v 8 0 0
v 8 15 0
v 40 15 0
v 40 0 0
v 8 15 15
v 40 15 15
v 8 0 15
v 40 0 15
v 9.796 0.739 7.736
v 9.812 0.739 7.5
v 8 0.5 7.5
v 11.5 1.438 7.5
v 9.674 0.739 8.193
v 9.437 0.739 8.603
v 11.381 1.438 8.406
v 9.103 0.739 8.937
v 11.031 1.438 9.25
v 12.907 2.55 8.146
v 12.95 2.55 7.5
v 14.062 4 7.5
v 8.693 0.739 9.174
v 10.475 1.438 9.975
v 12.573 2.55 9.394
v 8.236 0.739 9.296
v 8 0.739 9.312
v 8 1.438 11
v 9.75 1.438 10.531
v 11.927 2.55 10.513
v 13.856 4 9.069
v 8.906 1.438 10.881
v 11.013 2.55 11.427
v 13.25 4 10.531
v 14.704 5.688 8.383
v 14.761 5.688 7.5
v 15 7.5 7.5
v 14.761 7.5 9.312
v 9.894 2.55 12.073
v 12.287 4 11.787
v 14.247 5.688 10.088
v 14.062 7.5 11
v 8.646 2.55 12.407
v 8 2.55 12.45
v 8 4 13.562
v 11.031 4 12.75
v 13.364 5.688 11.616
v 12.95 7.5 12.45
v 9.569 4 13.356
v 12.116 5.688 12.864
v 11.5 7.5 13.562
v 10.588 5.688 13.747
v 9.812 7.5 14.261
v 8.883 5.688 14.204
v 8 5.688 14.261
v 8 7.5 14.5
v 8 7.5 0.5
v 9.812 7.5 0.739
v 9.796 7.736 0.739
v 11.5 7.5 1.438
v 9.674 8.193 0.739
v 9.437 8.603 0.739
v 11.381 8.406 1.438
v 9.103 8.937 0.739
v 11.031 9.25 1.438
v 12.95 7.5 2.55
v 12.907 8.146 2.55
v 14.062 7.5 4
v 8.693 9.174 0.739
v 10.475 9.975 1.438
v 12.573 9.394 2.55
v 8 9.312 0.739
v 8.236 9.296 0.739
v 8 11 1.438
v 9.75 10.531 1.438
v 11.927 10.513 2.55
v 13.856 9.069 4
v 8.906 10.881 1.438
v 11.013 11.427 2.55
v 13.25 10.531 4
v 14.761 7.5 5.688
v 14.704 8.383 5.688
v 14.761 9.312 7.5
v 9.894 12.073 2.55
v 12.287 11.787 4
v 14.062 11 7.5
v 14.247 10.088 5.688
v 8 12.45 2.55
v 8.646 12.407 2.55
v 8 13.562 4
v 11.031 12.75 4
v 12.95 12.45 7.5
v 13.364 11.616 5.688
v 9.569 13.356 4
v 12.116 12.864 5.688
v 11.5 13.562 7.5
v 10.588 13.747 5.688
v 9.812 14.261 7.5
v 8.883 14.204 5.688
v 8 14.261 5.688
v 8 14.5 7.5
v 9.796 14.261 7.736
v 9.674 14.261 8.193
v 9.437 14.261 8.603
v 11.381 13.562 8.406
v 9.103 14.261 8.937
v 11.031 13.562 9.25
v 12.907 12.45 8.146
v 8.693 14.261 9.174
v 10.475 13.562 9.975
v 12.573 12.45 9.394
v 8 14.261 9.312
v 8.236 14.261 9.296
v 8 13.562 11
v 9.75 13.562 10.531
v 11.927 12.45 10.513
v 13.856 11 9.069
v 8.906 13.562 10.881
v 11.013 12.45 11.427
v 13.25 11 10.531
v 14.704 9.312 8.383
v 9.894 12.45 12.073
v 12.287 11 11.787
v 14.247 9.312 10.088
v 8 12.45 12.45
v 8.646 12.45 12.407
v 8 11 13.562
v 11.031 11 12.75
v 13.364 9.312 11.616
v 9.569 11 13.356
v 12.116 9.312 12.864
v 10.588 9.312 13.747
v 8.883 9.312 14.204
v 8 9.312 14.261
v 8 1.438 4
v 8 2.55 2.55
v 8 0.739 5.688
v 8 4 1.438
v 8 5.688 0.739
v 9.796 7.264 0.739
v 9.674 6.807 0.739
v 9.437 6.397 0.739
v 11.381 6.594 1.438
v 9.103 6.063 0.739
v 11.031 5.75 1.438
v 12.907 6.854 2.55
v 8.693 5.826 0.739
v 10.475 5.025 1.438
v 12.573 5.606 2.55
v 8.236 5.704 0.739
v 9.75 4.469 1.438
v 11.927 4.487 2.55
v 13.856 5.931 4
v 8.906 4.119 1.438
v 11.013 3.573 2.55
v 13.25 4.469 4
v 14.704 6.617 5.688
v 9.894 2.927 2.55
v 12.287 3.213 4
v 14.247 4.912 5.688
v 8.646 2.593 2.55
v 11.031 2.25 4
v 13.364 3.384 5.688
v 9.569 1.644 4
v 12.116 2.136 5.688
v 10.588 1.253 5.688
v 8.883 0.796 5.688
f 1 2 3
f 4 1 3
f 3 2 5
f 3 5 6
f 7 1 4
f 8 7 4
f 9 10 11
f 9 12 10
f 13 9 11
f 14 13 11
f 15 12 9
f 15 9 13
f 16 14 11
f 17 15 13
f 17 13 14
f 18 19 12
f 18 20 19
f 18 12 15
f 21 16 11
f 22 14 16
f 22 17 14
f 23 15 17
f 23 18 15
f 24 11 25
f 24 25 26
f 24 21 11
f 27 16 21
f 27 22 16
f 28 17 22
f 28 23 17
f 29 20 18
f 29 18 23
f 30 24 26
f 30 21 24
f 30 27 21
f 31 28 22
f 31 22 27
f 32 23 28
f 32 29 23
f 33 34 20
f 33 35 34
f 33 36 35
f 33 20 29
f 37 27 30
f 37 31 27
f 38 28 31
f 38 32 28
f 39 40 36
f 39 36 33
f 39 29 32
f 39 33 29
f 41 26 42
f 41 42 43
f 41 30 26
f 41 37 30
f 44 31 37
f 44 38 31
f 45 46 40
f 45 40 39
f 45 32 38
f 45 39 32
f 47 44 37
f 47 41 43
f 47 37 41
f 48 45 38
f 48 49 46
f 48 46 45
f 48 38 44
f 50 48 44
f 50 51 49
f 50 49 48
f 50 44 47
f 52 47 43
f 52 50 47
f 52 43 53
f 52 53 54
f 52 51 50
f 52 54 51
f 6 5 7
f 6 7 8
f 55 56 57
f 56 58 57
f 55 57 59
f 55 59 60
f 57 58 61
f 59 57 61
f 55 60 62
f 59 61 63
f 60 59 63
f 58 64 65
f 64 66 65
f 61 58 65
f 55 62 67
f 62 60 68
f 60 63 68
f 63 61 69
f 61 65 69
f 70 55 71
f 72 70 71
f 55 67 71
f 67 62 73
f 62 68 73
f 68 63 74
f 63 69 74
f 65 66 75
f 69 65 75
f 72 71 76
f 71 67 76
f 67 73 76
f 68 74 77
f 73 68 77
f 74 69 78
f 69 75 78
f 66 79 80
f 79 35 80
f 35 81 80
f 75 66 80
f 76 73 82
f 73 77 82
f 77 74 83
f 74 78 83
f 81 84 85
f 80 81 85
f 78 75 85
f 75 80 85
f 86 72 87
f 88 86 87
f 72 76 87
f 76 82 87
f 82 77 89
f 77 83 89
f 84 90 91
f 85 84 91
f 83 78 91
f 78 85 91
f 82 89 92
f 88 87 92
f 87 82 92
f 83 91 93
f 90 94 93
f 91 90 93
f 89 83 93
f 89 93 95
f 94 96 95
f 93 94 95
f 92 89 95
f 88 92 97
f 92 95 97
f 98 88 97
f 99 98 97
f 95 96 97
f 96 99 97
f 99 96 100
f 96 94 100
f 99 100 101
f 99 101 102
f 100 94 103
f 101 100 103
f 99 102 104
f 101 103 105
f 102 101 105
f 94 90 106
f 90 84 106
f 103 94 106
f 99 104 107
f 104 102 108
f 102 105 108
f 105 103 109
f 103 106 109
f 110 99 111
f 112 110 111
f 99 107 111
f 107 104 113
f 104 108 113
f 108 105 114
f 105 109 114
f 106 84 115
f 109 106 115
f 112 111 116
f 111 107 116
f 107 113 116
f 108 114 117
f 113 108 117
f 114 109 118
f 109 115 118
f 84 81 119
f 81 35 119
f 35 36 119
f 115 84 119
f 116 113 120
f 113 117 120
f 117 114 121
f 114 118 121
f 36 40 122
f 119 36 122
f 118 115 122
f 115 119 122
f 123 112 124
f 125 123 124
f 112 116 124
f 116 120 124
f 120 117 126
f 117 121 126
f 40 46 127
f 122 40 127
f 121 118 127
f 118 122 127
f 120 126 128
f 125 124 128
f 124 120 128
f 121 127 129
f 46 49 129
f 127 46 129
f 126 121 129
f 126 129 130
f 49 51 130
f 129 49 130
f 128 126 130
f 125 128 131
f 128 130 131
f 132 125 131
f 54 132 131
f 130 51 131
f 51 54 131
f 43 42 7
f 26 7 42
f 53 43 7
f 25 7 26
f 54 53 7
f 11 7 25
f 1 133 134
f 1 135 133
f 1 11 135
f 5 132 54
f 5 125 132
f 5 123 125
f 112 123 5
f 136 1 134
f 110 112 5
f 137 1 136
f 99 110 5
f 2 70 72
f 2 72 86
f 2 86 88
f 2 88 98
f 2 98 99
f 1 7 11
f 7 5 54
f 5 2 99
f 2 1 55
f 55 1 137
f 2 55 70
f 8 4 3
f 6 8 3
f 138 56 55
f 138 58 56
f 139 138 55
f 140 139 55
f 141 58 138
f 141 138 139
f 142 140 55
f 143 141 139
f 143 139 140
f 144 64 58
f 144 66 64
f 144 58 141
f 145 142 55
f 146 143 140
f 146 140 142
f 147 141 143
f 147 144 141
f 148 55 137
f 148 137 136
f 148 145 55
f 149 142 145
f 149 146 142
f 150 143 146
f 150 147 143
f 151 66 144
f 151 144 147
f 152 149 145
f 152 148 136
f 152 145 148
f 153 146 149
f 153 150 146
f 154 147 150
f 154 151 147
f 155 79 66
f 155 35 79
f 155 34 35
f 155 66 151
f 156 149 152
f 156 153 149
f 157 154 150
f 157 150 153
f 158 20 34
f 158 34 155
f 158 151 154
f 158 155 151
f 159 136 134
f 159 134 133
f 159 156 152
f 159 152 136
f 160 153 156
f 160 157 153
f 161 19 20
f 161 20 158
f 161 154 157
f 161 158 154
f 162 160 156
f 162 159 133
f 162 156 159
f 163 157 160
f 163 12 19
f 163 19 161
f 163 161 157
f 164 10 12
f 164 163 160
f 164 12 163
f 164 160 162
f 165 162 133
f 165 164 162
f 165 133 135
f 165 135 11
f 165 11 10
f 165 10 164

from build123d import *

# Parameters (mm, degrees)
F0_W     = 40
F0_H     = 15
F1_DEPTH = 15
F2_W     = 14
F2_H     = 14
F3_DEPTH = 15
F4_R     = 6.99999
F5_DEPTH = 8


# Not quite as in the source:
# - a fillet or chamfer is up to 0.001 mm smaller than in the source, because OpenCascade refuses the exact size


with BuildPart() as f1:
    # F0 (on Top) → F1 (new body)
    with BuildSketch(Plane.XY):
        with Locations((20, 7.5)):
            Rectangle(F0_W, F0_H)
    extrude(amount=F1_DEPTH)

    # F2 (on face) → F3 (cut)
    with BuildSketch(Plane(origin=(0, 0, 0), x_dir=(0, -1, 0), z_dir=(-1, 0, 0))):
        with Locations((-7.5, 7.5)):
            Rectangle(F2_W, F2_H)
    extrude(amount=-F3_DEPTH, mode=Mode.SUBTRACT)

    # F4 (radius 7 in the source; OpenCascade refuses exactly that, so slightly less here)
    f4_edges = [f1.edges().sort_by_distance(p)[0] for p in [
        (15, 7.5, 14.5),
        (15, 14.5, 7.5),
        (7.5, 14.5, 14.5),
        (15, 0.5, 7.5),
        (15, 7.5, 0.5),
        (7.5, 0.5, 14.5),
        (7.5, 0.5, 0.5),
        (7.5, 14.5, 0.5),
    ]]
    fillet(f4_edges, radius=F4_R)

    # F5 (cut): a face of the model
    f5_faces = [f1.faces().sort_by_distance(p)[0] for p in [
        (0, 0.2878679656, 7.5),
    ]]
    extrude(f5_faces, amount=-F5_DEPTH, mode=Mode.SUBTRACT)


solid = f1.part
